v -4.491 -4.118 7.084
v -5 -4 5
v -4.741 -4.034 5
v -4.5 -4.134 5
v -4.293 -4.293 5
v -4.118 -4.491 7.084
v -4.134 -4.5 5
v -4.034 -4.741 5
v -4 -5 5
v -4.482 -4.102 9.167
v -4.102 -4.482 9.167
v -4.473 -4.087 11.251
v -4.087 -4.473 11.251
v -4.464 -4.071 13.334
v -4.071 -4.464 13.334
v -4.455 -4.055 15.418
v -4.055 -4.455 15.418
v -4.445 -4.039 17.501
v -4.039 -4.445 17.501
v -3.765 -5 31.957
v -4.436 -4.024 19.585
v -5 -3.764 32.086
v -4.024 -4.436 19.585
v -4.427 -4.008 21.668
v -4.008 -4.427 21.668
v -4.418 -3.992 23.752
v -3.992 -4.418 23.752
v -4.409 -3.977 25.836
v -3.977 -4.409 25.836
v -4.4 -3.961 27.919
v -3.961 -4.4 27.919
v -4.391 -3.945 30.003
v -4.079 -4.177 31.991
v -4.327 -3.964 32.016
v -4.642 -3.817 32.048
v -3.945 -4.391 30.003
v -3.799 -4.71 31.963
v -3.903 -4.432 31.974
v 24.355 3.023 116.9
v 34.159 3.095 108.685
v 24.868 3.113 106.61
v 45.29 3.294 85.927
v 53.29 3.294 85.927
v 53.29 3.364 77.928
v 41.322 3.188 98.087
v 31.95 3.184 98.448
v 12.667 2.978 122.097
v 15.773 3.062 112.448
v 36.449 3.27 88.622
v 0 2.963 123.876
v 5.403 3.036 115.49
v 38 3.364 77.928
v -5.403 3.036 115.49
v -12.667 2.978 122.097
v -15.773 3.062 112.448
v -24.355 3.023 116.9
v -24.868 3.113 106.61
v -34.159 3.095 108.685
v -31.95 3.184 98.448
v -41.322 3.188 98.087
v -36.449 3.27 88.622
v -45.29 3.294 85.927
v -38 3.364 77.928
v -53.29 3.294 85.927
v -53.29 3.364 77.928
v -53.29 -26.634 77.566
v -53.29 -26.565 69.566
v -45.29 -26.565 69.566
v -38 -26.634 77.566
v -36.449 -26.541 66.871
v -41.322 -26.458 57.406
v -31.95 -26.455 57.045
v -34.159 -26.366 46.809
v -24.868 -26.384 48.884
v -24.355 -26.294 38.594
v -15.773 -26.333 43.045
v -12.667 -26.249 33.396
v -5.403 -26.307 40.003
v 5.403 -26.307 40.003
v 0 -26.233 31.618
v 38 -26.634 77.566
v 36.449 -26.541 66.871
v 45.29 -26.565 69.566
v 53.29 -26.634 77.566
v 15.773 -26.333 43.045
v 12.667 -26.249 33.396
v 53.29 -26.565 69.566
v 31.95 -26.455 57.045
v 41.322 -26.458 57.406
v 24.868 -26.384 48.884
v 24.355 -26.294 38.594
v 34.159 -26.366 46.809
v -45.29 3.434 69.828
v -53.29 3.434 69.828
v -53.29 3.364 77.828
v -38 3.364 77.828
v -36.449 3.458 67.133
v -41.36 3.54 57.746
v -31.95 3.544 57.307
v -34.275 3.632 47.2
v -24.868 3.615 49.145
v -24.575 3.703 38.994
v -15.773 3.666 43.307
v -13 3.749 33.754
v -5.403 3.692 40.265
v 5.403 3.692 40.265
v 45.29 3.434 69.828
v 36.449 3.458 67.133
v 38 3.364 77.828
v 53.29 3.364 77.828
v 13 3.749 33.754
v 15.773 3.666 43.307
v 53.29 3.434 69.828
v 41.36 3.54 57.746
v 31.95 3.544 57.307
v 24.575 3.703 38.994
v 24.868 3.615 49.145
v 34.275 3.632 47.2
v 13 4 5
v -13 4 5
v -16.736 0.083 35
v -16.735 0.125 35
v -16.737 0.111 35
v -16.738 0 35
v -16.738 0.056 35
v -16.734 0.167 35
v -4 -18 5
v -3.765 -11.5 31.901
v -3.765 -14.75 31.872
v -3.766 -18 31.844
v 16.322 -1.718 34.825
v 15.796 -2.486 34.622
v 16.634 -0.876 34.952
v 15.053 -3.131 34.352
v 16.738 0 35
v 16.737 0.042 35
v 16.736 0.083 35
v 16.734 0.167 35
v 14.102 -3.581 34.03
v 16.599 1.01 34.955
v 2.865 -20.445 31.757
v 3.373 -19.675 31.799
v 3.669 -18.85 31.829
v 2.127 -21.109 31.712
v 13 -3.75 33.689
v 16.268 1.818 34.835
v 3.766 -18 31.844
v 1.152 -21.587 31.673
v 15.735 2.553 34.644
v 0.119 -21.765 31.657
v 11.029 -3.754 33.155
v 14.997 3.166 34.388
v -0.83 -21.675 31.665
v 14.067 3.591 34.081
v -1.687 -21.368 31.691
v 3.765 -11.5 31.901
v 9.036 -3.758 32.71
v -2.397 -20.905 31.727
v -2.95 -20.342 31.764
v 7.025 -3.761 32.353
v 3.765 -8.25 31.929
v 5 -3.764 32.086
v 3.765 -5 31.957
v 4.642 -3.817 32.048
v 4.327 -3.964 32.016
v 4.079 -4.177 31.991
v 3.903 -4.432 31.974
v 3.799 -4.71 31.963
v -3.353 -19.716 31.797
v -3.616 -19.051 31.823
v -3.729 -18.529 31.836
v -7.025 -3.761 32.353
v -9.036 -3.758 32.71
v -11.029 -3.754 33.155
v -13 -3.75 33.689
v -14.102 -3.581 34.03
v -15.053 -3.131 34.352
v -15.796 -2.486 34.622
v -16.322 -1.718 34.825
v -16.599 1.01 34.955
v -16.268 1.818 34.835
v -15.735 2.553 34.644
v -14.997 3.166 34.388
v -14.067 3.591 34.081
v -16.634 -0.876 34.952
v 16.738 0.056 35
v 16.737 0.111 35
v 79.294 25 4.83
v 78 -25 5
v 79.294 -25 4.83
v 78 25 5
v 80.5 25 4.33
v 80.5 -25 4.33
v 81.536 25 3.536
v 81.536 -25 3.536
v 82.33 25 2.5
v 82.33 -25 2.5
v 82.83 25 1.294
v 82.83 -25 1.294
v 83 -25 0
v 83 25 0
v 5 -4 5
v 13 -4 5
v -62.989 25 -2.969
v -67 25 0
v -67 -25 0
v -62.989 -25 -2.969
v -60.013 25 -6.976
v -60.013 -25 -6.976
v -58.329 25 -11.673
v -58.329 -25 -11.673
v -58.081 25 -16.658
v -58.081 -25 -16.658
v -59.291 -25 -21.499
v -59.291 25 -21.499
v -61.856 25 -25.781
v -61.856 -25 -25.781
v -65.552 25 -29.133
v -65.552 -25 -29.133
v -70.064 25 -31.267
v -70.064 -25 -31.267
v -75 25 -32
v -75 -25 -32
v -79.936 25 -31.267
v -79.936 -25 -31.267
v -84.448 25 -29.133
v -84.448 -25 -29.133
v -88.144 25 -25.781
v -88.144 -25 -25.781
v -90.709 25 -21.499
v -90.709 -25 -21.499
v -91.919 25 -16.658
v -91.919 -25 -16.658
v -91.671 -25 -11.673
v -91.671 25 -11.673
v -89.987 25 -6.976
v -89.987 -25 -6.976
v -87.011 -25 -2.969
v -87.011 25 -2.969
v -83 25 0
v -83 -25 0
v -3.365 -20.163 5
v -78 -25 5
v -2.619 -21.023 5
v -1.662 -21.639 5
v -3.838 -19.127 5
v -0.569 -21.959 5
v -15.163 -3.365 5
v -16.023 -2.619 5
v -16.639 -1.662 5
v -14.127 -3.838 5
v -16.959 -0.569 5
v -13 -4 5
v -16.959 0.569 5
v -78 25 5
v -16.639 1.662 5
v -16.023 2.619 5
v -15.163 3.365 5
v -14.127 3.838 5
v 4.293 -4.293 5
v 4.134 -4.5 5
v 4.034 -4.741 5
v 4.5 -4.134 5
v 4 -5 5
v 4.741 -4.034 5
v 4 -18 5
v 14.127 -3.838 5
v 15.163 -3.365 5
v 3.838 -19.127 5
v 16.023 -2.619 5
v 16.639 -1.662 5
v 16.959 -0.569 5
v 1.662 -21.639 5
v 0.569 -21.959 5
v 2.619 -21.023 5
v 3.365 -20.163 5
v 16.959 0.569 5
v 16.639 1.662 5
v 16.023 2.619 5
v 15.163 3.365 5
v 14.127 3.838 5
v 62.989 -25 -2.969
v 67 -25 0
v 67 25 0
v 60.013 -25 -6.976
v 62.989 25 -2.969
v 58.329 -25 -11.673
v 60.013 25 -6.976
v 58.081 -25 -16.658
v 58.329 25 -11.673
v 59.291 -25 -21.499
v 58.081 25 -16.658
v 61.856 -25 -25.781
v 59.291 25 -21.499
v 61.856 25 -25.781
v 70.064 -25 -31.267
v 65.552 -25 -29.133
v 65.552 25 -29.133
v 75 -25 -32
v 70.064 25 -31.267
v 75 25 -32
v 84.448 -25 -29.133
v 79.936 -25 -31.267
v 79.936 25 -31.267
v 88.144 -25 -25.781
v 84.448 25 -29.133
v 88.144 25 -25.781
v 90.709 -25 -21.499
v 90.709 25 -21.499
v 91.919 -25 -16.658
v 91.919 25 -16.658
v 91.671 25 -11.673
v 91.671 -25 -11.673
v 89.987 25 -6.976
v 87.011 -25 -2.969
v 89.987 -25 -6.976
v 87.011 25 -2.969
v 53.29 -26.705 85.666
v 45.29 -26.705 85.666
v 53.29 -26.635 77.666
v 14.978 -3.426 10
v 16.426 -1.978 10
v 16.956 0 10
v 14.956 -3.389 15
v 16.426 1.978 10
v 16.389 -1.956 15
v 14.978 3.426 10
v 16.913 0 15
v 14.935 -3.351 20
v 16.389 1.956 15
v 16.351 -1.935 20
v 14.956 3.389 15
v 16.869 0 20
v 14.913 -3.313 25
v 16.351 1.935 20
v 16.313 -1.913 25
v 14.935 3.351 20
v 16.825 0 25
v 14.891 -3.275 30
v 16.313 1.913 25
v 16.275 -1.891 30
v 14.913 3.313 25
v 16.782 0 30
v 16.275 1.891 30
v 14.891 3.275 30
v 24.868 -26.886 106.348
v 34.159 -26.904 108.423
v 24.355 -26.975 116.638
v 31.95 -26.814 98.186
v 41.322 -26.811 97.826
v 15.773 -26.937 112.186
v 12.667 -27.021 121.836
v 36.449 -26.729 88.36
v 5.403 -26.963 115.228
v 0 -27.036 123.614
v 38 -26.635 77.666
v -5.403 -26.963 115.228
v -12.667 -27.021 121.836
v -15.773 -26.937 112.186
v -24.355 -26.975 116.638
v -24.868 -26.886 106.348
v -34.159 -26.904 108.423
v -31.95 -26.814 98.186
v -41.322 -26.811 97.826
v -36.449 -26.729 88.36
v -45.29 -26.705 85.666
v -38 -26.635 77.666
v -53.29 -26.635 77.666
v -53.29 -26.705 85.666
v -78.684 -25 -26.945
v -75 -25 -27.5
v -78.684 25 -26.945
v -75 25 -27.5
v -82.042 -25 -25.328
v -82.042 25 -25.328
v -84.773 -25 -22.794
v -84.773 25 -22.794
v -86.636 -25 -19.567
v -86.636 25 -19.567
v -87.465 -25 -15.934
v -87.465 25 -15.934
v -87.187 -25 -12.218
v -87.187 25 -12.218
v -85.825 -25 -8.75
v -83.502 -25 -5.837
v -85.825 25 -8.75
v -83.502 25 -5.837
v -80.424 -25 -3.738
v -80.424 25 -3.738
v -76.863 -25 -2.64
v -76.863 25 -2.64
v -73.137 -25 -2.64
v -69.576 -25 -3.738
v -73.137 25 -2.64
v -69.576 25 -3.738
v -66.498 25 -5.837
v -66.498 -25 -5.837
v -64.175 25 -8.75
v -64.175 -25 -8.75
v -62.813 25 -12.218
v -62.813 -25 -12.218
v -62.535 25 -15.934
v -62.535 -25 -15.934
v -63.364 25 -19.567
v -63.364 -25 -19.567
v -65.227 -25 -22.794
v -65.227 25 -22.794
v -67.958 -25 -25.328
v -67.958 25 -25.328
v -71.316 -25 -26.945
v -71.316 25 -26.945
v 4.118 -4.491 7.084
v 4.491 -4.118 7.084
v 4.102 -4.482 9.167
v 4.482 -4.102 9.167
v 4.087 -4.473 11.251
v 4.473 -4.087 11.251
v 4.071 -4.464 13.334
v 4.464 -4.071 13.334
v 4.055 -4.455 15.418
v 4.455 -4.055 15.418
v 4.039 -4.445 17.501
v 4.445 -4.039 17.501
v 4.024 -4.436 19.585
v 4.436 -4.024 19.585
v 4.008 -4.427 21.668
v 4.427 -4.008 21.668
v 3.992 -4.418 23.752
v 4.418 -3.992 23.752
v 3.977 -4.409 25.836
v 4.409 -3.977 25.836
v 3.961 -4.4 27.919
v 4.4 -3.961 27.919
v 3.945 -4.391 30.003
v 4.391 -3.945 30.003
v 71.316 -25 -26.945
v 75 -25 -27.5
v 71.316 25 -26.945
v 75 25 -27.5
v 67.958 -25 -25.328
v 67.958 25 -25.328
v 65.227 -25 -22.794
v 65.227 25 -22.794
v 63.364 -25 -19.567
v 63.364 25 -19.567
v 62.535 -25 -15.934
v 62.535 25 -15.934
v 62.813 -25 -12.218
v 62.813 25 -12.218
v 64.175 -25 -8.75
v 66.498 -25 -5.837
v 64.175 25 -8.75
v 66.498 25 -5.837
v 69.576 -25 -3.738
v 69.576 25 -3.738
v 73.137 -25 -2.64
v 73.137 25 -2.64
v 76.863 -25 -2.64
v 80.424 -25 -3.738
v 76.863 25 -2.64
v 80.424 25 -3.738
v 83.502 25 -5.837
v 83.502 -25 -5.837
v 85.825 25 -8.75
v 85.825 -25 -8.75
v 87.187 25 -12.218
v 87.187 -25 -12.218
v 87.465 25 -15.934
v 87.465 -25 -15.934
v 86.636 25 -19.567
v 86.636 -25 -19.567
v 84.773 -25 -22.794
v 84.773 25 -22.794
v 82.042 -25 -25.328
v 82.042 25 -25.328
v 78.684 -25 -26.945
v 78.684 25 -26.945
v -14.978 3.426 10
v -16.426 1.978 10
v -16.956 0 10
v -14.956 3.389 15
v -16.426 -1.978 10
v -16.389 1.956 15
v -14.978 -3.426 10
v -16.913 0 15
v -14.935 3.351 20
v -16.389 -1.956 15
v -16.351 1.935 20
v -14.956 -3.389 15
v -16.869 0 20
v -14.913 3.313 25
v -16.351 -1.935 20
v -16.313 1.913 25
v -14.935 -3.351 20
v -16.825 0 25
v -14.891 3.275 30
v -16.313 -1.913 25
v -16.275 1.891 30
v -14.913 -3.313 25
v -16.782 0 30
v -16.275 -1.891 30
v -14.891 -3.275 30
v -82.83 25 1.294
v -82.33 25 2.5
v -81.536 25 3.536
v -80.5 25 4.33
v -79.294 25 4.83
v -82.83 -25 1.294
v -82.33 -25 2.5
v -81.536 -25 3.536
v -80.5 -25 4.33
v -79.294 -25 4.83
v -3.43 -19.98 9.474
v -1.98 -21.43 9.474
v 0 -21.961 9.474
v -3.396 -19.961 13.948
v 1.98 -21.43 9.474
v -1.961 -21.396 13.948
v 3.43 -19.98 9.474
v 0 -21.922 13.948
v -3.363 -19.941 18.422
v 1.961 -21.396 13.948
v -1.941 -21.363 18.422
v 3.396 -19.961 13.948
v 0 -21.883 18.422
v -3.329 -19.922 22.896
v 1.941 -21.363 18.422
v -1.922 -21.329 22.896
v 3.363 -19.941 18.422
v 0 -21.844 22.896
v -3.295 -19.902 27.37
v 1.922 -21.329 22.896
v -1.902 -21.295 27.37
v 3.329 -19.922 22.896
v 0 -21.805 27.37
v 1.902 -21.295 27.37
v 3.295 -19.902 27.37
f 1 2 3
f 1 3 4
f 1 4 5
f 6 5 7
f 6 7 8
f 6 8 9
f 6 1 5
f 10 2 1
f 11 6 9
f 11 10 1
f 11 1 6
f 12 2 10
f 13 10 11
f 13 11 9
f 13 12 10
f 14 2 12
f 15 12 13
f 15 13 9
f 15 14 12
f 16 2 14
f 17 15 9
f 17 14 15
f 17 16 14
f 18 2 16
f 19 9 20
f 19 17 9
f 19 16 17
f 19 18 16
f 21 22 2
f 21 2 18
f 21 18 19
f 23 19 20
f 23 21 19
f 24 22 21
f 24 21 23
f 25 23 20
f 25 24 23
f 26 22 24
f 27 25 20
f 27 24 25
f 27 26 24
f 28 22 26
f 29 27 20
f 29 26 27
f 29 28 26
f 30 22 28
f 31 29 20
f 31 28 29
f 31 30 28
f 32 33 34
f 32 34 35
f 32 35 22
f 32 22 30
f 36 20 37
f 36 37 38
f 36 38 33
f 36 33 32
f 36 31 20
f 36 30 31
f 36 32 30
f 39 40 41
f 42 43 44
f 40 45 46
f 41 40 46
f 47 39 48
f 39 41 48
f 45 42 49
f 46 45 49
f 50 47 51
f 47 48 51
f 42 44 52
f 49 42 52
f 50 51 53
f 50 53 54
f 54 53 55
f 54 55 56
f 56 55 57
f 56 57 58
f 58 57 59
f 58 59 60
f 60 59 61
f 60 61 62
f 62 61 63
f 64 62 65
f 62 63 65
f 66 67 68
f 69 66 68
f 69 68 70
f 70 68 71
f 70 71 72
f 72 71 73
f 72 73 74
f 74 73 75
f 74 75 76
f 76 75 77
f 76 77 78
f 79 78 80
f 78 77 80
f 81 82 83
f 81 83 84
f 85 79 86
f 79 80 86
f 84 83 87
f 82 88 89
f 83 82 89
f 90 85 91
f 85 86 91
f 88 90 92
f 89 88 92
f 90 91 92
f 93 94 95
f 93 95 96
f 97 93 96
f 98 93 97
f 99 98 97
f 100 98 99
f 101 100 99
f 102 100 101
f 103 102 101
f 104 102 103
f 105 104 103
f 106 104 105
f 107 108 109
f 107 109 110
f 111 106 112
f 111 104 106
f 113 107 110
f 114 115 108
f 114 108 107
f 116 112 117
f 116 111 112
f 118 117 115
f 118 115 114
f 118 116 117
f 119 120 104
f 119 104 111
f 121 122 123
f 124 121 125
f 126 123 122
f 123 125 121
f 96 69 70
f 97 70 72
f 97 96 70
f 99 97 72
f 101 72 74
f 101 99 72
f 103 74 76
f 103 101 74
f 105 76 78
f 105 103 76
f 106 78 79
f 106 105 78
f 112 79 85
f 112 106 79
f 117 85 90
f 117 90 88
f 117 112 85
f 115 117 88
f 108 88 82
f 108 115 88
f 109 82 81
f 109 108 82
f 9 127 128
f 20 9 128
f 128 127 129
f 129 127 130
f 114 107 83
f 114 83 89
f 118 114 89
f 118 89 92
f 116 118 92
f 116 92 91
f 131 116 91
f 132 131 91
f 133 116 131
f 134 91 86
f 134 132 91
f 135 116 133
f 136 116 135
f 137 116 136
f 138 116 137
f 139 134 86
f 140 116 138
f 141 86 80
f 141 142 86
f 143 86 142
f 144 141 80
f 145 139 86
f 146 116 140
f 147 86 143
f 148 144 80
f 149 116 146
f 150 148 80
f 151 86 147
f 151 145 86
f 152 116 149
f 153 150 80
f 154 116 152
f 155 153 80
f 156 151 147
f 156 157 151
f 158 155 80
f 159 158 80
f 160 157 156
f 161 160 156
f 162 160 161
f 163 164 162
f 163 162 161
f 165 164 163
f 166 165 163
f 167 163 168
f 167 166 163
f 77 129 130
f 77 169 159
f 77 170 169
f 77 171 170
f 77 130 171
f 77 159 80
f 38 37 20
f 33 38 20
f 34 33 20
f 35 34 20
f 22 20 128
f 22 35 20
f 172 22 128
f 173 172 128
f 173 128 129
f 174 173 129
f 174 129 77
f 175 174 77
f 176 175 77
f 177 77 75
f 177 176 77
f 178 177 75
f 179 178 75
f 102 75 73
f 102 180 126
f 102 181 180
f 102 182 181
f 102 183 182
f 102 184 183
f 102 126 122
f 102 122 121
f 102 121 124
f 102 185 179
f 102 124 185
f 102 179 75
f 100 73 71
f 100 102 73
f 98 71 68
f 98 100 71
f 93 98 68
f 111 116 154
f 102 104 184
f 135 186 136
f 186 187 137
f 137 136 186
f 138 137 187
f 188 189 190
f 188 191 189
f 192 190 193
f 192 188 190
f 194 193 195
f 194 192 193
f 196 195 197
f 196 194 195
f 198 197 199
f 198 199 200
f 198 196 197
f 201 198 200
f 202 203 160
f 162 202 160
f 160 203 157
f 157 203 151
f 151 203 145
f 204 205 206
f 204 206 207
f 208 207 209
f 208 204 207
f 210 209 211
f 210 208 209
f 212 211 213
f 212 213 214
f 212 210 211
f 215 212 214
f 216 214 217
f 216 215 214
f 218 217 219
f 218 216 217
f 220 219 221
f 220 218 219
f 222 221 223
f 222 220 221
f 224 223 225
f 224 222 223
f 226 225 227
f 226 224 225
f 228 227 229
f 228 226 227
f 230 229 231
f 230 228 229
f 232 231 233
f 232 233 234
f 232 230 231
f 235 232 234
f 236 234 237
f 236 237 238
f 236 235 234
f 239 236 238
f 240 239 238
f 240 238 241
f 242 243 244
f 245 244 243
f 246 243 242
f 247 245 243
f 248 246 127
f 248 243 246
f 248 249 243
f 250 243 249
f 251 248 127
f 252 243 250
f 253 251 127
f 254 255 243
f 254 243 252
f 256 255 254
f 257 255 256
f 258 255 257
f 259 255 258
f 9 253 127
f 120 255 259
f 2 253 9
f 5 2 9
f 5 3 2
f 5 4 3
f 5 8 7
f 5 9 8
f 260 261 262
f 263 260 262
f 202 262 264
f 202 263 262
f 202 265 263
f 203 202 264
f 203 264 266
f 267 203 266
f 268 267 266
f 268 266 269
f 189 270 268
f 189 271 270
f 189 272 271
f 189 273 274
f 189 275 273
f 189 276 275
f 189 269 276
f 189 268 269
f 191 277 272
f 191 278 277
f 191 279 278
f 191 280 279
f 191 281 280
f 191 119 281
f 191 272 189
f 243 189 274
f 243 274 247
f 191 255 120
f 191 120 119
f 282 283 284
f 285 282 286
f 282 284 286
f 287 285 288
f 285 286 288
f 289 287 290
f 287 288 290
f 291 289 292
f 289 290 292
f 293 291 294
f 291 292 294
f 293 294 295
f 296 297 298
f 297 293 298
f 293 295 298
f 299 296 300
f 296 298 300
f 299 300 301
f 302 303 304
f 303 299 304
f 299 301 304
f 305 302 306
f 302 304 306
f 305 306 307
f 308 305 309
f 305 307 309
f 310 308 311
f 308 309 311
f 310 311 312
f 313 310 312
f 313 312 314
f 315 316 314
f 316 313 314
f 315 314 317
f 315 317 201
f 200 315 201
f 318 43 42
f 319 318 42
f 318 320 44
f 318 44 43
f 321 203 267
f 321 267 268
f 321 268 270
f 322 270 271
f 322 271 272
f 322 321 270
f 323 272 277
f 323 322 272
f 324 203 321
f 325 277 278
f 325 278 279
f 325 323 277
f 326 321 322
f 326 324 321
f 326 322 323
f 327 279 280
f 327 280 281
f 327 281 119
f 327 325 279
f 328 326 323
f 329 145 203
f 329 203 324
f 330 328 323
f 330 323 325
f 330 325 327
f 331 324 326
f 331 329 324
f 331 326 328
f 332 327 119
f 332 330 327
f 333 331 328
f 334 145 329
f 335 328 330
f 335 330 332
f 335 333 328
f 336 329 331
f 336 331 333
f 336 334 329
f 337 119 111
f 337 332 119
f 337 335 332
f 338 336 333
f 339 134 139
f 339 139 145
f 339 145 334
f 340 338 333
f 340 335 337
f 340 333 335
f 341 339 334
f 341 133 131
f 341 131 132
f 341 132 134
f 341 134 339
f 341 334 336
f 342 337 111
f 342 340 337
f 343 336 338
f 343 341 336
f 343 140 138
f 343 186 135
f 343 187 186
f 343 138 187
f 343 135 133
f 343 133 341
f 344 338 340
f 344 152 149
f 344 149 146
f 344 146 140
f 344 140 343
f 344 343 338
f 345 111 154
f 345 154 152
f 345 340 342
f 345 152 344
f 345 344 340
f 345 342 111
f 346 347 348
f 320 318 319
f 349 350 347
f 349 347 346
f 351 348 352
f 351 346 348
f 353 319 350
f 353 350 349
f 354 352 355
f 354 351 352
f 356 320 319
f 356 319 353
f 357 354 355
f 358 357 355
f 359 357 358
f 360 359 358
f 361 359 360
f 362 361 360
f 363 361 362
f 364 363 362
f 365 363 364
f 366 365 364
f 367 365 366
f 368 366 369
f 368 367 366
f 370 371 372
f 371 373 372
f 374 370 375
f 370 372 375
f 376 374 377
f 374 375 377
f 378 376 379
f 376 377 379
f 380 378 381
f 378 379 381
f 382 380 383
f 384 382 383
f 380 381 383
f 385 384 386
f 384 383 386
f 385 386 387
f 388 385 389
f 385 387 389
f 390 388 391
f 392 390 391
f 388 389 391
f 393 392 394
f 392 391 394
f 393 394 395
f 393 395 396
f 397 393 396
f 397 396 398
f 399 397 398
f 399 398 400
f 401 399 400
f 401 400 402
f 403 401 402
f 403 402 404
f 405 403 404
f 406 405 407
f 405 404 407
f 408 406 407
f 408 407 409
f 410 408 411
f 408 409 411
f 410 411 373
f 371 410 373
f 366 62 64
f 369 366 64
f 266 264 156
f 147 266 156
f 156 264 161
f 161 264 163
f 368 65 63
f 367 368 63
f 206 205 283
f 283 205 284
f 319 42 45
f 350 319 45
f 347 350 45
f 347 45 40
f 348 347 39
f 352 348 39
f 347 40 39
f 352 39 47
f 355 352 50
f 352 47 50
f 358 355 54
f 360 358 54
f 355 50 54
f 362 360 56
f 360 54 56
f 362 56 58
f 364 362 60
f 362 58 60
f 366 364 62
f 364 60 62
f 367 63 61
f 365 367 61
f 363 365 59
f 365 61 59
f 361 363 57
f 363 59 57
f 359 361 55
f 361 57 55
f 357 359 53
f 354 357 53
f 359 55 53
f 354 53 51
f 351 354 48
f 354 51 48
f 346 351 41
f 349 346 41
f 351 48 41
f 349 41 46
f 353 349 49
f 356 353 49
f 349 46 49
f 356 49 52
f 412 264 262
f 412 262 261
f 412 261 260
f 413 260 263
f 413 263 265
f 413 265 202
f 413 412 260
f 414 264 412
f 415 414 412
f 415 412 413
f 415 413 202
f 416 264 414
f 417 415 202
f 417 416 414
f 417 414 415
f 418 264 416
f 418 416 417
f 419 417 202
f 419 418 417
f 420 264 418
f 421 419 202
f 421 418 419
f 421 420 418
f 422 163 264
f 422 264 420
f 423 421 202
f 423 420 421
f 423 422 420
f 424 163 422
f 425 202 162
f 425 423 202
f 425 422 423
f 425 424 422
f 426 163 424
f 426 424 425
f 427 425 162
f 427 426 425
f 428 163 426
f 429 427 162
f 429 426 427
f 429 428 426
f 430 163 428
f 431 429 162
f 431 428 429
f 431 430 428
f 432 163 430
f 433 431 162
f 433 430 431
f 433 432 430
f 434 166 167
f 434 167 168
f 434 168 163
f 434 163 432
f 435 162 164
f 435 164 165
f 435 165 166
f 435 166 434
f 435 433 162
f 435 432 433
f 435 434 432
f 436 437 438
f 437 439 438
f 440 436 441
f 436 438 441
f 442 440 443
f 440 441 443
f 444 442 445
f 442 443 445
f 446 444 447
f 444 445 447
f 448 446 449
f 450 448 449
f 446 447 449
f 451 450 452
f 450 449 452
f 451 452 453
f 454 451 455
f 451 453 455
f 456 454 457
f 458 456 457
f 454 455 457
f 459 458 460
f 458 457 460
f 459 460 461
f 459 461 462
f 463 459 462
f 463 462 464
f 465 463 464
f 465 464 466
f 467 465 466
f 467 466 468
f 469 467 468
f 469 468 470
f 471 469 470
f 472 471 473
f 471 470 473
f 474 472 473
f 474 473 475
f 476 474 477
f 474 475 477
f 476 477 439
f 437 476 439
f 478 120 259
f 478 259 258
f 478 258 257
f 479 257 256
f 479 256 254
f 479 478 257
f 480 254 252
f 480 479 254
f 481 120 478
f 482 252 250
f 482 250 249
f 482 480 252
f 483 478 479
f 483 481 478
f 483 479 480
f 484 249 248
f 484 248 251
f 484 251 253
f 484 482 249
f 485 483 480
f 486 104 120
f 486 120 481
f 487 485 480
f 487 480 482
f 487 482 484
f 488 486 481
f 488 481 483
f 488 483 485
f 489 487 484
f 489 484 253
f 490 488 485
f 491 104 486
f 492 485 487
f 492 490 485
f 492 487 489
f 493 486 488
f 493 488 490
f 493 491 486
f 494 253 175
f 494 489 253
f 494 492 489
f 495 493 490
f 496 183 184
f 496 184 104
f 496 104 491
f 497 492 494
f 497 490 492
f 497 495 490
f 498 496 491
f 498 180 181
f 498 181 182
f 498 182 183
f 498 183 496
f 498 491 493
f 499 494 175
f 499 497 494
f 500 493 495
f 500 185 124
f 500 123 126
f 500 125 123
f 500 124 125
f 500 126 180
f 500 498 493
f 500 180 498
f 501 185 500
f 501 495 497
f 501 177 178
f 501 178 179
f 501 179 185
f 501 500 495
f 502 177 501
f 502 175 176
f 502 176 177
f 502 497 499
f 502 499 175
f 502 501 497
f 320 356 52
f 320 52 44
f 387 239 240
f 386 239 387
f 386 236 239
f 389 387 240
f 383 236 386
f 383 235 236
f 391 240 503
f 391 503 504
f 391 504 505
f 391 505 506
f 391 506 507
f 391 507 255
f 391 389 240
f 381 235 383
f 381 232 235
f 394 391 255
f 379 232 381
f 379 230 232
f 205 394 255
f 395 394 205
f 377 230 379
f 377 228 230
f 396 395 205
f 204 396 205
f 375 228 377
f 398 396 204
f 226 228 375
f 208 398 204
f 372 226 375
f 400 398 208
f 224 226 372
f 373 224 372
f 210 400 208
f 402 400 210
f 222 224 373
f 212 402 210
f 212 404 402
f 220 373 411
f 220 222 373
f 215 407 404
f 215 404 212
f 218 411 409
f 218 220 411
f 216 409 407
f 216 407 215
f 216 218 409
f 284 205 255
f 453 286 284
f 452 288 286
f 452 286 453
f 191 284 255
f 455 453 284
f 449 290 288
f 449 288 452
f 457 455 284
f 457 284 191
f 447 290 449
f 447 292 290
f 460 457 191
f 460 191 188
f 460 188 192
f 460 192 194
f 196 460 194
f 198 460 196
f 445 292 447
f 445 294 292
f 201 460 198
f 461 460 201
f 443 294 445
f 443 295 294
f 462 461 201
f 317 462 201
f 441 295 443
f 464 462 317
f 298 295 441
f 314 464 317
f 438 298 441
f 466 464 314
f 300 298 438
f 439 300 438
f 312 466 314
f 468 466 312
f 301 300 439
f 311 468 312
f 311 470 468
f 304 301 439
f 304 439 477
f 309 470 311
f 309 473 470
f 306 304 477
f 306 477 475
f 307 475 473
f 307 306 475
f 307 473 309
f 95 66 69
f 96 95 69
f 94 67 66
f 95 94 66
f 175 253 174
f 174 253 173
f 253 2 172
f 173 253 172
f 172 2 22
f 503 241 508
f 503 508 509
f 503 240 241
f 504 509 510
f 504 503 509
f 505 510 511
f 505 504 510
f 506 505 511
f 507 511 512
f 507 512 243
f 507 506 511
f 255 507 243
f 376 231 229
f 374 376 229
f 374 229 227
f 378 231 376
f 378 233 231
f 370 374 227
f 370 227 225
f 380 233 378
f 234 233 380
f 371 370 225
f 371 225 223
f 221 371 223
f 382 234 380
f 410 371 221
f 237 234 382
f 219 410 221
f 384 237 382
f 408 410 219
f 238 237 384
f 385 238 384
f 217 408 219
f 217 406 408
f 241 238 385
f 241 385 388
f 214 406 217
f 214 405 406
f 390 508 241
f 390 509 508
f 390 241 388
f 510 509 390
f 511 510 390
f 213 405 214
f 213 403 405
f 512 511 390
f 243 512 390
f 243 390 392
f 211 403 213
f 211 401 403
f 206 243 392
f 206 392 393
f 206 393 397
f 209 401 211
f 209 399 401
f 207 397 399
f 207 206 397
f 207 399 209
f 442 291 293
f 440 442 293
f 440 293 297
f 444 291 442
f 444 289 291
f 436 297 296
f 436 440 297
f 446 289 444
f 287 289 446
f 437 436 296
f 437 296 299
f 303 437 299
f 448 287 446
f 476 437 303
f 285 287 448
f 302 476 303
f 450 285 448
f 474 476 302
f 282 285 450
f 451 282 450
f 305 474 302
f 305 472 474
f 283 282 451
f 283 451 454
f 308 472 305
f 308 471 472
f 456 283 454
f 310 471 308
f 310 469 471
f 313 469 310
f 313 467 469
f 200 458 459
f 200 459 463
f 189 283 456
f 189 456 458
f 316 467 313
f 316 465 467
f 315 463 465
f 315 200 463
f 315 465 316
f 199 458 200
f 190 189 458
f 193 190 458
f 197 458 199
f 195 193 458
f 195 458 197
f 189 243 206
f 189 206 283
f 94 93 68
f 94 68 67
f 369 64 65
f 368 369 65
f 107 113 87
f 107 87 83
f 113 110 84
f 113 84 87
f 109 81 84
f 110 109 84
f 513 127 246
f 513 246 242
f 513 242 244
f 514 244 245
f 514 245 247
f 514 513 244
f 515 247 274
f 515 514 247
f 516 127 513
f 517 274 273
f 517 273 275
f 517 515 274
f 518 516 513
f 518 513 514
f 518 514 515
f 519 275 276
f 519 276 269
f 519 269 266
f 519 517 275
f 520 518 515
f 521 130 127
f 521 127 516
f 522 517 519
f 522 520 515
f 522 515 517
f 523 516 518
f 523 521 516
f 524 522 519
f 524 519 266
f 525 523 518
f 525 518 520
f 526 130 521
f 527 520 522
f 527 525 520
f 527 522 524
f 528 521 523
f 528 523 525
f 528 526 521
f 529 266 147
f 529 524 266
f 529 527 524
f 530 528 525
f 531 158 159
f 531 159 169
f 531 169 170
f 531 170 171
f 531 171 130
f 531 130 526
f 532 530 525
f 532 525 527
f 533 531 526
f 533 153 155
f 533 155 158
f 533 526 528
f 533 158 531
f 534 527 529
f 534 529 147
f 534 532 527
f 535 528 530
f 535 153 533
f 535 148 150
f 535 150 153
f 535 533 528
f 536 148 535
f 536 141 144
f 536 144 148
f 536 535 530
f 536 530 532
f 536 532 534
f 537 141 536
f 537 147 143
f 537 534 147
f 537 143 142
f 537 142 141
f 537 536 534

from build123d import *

# Parameters (mm, degrees)
SKETCH_1_W                  = 166
SKETCH_1_H                  = 50
EXTRUDE_1_DEPTH             = 5
EXTRUDE_4_REACH             = 88.827
SKETCH_4_R                  = 12.5
EXTRUDE_4_DIRECTION_2_REACH = 88.827
FILLET_1_R                  = 5
EXTRUDE_2_DEPTH             = 30
EXTRUDE_2_TAPER             = 0.5
EXTRUDE_3_DEPTH             = 30


with BuildPart() as part:
    # Эскиз1 → Бобышка-Вытянуть1 (new body)
    with BuildSketch(Plane.XY):
        Rectangle(SKETCH_1_W, SKETCH_1_H)
    extrude(amount=EXTRUDE_1_DEPTH)

    # Бобышка-Вытянуть4: up to this face of the body (flat: up to its plane)
    extrude_4_end = Plane(part.part.faces().sort_by_distance((0, 25, 2.5))[0])
    # Эскиз4 → Бобышка-Вытянуть4 (add, up to the picked face)
    with BuildSketch(Plane(origin=(0, 0, 0), x_dir=(1, 0, 0), z_dir=(0, 1, 0)), mode=Mode.PRIVATE) as extrude_4_sk1:
        with BuildLine():
            Line((-83, 0), (-67, 0))
            ThreePointArc((-67, 0), (-75, 32), (-83, 0))
        make_face()
        with Locations(Location((-75, 15, 0), (0, 0, 90))):
            Circle(SKETCH_4_R, mode=Mode.SUBTRACT)
    extrude_4_tool1 = split(extrude(extrude_4_sk1.sketch, amount=EXTRUDE_4_REACH, mode=Mode.PRIVATE), bisect_by=extrude_4_end, keep=Keep.BOTH, mode=Mode.PRIVATE)
    # Эскиз4 → Бобышка-Вытянуть4 (add, up to the picked face)
    with BuildSketch(Plane(origin=(0, 0, 0), x_dir=(1, 0, 0), z_dir=(0, 1, 0)), mode=Mode.PRIVATE) as extrude_4_sk2:
        with BuildLine():
            Line((83, 0), (67, 0))
            ThreePointArc((67, 0), (75, 32), (83, 0))
        make_face()
        with Locations(Location((75, 15, 0), (0, 0, 90))):
            Circle(SKETCH_4_R, mode=Mode.SUBTRACT)
    extrude_4_tool2 = split(extrude(extrude_4_sk2.sketch, amount=EXTRUDE_4_REACH, mode=Mode.PRIVATE), bisect_by=extrude_4_end, keep=Keep.BOTH, mode=Mode.PRIVATE)
    add(extrude_4_tool1.solids().sort_by(Axis((-75, 0, -31.533095), (0, 1, 0)))[0])
    add(extrude_4_tool2.solids().sort_by(Axis((75, 0, -31.533095), (0, 1, 0)))[0])

    # Бобышка-Вытянуть4 direction 2: up to this face of the body (flat: up to its plane)
    extrude_4_direction_2_end = Plane(part.part.faces().sort_by_distance((0, -25, 2.5))[0])
    # Эскиз4 → Бобышка-Вытянуть4 direction 2 (add, up to the picked face)
    with BuildSketch(Plane(origin=(0, 0, 0), x_dir=(1, 0, 0), z_dir=(0, 1, 0)), mode=Mode.PRIVATE) as extrude_4_direction_2_sk1:
        with BuildLine():
            Line((-83, 0), (-67, 0))
            ThreePointArc((-67, 0), (-75, 32), (-83, 0))
        make_face()
        with Locations(Location((-75, 15, 0), (0, 0, 90))):
            Circle(SKETCH_4_R, mode=Mode.SUBTRACT)
    extrude_4_direction_2_tool1 = split(extrude(extrude_4_direction_2_sk1.sketch, amount=-EXTRUDE_4_DIRECTION_2_REACH, mode=Mode.PRIVATE), bisect_by=extrude_4_direction_2_end, keep=Keep.BOTH, mode=Mode.PRIVATE)
    # Эскиз4 → Бобышка-Вытянуть4 direction 2 (add, up to the picked face)
    with BuildSketch(Plane(origin=(0, 0, 0), x_dir=(1, 0, 0), z_dir=(0, 1, 0)), mode=Mode.PRIVATE) as extrude_4_direction_2_sk2:
        with BuildLine():
            Line((83, 0), (67, 0))
            ThreePointArc((67, 0), (75, 32), (83, 0))
        make_face()
        with Locations(Location((75, 15, 0), (0, 0, 90))):
            Circle(SKETCH_4_R, mode=Mode.SUBTRACT)
    extrude_4_direction_2_tool2 = split(extrude(extrude_4_direction_2_sk2.sketch, amount=-EXTRUDE_4_DIRECTION_2_REACH, mode=Mode.PRIVATE), bisect_by=extrude_4_direction_2_end, keep=Keep.BOTH, mode=Mode.PRIVATE)
    add(extrude_4_direction_2_tool1.solids().sort_by(Axis((-75, 0, -31.533095), (0, -1, 0)))[0])
    add(extrude_4_direction_2_tool2.solids().sort_by(Axis((75, 0, -31.533095), (0, -1, 0)))[0])

    # Скругление1
    fillet_1_edges = [part.edges().sort_by_distance(p)[0] for p in [
        (83, 0, 5),
        (-83, 0, 5),
    ]]
    fillet(fillet_1_edges, radius=FILLET_1_R - 0.0001)  # a hair under: the kernel refuses the full size

    # Эскиз2 → Бобышка-Вытянуть2 (add)
    with BuildSketch(Plane.XY.offset(5)):
        with BuildLine():
            ThreePointArc((-13, 4), (-17, 0), (-13, -4))
            Line((-13, -4), (-5, -4))
            ThreePointArc((-5, -4), (-4.292893219, -4.292893219), (-4, -5))
            Line((-4, -5), (-4, -18))
            ThreePointArc((-4, -18), (0, -22), (4, -18))
            Line((4, -18), (4, -5))
            ThreePointArc((4, -5), (4.292893219, -4.292893219), (5, -4))
            Line((5, -4), (13, -4))
            ThreePointArc((13, -4), (17, 0), (13, 4))
            Line((13, 4), (-13, 4))
        make_face()
    extrude(amount=EXTRUDE_2_DEPTH, taper=EXTRUDE_2_TAPER)

    # Эскиз3 → Бобышка-Вытянуть3 (add)
    with BuildSketch(Plane(origin=(0, 4.043326406, 0.035285575), x_dir=(1, 0, 0), z_dir=(0, 0.9999619230641713, 0.008726535498373954))):
        with BuildLine():
            Line((37.999967105, -77.795289998), (53.290147935, -77.795289998))
            Line((53.290147935, -77.795289998), (53.290147935, -69.795289998))
            Line((53.290147935, -69.795289998), (45.290147935, -69.795289998))
            ThreePointArc((45.290147935, -69.795289998), (0, -31.845289998), (-45.290147935, -69.795289998))
            Line((-45.290147935, -69.795289998), (-53.290147935, -69.795289998))
            Line((-53.290147935, -69.795289998), (-53.290147935, -77.795289998))
            Line((-53.290147935, -77.795289998), (-37.999967105, -77.795289998))
            ThreePointArc((-37.999967105, -77.795289998), (0, -39.845289998), (37.999967105, -77.795289998))
        make_face()
        with BuildLine():
            Line((-53.290147935, -77.895289998), (-37.999967105, -77.895289998))
            ThreePointArc((-37.999967105, -77.895289998), (0, -115.845289998), (37.999967105, -77.895289998))
            Line((37.999967105, -77.895289998), (53.290147935, -77.895289998))
            Line((53.290147935, -77.895289998), (53.290147935, -85.895289998))
            Line((53.290147935, -85.895289998), (45.290147935, -85.895289998))
            ThreePointArc((45.290147935, -85.895289998), (0, -123.845289998), (-45.290147935, -85.895289998))
            Line((-45.290147935, -85.895289998), (-53.290147935, -85.895289998))
            Line((-53.290147935, -85.895289998), (-53.290147935, -77.895289998))
        make_face()
    extrude(amount=-EXTRUDE_3_DEPTH)


with BuildPart() as extrude_3_piece_1:
    # of the separate pieces the step leaves, piece 1, a body of its own (extrude_3_pieces)
    add(part.part.solids().sort_by_distance((-83, 25, 0.0001))[0])


with BuildPart() as extrude_3_piece_2:
    # of the separate pieces the step leaves, piece 2, a body of its own (extrude_3_pieces)
    add(part.part.solids().sort_by_distance((-45.290147935, 3.293758109, 85.927304944))[0])


solid = Compound([extrude_3_piece_1.part, extrude_3_piece_2.part])
